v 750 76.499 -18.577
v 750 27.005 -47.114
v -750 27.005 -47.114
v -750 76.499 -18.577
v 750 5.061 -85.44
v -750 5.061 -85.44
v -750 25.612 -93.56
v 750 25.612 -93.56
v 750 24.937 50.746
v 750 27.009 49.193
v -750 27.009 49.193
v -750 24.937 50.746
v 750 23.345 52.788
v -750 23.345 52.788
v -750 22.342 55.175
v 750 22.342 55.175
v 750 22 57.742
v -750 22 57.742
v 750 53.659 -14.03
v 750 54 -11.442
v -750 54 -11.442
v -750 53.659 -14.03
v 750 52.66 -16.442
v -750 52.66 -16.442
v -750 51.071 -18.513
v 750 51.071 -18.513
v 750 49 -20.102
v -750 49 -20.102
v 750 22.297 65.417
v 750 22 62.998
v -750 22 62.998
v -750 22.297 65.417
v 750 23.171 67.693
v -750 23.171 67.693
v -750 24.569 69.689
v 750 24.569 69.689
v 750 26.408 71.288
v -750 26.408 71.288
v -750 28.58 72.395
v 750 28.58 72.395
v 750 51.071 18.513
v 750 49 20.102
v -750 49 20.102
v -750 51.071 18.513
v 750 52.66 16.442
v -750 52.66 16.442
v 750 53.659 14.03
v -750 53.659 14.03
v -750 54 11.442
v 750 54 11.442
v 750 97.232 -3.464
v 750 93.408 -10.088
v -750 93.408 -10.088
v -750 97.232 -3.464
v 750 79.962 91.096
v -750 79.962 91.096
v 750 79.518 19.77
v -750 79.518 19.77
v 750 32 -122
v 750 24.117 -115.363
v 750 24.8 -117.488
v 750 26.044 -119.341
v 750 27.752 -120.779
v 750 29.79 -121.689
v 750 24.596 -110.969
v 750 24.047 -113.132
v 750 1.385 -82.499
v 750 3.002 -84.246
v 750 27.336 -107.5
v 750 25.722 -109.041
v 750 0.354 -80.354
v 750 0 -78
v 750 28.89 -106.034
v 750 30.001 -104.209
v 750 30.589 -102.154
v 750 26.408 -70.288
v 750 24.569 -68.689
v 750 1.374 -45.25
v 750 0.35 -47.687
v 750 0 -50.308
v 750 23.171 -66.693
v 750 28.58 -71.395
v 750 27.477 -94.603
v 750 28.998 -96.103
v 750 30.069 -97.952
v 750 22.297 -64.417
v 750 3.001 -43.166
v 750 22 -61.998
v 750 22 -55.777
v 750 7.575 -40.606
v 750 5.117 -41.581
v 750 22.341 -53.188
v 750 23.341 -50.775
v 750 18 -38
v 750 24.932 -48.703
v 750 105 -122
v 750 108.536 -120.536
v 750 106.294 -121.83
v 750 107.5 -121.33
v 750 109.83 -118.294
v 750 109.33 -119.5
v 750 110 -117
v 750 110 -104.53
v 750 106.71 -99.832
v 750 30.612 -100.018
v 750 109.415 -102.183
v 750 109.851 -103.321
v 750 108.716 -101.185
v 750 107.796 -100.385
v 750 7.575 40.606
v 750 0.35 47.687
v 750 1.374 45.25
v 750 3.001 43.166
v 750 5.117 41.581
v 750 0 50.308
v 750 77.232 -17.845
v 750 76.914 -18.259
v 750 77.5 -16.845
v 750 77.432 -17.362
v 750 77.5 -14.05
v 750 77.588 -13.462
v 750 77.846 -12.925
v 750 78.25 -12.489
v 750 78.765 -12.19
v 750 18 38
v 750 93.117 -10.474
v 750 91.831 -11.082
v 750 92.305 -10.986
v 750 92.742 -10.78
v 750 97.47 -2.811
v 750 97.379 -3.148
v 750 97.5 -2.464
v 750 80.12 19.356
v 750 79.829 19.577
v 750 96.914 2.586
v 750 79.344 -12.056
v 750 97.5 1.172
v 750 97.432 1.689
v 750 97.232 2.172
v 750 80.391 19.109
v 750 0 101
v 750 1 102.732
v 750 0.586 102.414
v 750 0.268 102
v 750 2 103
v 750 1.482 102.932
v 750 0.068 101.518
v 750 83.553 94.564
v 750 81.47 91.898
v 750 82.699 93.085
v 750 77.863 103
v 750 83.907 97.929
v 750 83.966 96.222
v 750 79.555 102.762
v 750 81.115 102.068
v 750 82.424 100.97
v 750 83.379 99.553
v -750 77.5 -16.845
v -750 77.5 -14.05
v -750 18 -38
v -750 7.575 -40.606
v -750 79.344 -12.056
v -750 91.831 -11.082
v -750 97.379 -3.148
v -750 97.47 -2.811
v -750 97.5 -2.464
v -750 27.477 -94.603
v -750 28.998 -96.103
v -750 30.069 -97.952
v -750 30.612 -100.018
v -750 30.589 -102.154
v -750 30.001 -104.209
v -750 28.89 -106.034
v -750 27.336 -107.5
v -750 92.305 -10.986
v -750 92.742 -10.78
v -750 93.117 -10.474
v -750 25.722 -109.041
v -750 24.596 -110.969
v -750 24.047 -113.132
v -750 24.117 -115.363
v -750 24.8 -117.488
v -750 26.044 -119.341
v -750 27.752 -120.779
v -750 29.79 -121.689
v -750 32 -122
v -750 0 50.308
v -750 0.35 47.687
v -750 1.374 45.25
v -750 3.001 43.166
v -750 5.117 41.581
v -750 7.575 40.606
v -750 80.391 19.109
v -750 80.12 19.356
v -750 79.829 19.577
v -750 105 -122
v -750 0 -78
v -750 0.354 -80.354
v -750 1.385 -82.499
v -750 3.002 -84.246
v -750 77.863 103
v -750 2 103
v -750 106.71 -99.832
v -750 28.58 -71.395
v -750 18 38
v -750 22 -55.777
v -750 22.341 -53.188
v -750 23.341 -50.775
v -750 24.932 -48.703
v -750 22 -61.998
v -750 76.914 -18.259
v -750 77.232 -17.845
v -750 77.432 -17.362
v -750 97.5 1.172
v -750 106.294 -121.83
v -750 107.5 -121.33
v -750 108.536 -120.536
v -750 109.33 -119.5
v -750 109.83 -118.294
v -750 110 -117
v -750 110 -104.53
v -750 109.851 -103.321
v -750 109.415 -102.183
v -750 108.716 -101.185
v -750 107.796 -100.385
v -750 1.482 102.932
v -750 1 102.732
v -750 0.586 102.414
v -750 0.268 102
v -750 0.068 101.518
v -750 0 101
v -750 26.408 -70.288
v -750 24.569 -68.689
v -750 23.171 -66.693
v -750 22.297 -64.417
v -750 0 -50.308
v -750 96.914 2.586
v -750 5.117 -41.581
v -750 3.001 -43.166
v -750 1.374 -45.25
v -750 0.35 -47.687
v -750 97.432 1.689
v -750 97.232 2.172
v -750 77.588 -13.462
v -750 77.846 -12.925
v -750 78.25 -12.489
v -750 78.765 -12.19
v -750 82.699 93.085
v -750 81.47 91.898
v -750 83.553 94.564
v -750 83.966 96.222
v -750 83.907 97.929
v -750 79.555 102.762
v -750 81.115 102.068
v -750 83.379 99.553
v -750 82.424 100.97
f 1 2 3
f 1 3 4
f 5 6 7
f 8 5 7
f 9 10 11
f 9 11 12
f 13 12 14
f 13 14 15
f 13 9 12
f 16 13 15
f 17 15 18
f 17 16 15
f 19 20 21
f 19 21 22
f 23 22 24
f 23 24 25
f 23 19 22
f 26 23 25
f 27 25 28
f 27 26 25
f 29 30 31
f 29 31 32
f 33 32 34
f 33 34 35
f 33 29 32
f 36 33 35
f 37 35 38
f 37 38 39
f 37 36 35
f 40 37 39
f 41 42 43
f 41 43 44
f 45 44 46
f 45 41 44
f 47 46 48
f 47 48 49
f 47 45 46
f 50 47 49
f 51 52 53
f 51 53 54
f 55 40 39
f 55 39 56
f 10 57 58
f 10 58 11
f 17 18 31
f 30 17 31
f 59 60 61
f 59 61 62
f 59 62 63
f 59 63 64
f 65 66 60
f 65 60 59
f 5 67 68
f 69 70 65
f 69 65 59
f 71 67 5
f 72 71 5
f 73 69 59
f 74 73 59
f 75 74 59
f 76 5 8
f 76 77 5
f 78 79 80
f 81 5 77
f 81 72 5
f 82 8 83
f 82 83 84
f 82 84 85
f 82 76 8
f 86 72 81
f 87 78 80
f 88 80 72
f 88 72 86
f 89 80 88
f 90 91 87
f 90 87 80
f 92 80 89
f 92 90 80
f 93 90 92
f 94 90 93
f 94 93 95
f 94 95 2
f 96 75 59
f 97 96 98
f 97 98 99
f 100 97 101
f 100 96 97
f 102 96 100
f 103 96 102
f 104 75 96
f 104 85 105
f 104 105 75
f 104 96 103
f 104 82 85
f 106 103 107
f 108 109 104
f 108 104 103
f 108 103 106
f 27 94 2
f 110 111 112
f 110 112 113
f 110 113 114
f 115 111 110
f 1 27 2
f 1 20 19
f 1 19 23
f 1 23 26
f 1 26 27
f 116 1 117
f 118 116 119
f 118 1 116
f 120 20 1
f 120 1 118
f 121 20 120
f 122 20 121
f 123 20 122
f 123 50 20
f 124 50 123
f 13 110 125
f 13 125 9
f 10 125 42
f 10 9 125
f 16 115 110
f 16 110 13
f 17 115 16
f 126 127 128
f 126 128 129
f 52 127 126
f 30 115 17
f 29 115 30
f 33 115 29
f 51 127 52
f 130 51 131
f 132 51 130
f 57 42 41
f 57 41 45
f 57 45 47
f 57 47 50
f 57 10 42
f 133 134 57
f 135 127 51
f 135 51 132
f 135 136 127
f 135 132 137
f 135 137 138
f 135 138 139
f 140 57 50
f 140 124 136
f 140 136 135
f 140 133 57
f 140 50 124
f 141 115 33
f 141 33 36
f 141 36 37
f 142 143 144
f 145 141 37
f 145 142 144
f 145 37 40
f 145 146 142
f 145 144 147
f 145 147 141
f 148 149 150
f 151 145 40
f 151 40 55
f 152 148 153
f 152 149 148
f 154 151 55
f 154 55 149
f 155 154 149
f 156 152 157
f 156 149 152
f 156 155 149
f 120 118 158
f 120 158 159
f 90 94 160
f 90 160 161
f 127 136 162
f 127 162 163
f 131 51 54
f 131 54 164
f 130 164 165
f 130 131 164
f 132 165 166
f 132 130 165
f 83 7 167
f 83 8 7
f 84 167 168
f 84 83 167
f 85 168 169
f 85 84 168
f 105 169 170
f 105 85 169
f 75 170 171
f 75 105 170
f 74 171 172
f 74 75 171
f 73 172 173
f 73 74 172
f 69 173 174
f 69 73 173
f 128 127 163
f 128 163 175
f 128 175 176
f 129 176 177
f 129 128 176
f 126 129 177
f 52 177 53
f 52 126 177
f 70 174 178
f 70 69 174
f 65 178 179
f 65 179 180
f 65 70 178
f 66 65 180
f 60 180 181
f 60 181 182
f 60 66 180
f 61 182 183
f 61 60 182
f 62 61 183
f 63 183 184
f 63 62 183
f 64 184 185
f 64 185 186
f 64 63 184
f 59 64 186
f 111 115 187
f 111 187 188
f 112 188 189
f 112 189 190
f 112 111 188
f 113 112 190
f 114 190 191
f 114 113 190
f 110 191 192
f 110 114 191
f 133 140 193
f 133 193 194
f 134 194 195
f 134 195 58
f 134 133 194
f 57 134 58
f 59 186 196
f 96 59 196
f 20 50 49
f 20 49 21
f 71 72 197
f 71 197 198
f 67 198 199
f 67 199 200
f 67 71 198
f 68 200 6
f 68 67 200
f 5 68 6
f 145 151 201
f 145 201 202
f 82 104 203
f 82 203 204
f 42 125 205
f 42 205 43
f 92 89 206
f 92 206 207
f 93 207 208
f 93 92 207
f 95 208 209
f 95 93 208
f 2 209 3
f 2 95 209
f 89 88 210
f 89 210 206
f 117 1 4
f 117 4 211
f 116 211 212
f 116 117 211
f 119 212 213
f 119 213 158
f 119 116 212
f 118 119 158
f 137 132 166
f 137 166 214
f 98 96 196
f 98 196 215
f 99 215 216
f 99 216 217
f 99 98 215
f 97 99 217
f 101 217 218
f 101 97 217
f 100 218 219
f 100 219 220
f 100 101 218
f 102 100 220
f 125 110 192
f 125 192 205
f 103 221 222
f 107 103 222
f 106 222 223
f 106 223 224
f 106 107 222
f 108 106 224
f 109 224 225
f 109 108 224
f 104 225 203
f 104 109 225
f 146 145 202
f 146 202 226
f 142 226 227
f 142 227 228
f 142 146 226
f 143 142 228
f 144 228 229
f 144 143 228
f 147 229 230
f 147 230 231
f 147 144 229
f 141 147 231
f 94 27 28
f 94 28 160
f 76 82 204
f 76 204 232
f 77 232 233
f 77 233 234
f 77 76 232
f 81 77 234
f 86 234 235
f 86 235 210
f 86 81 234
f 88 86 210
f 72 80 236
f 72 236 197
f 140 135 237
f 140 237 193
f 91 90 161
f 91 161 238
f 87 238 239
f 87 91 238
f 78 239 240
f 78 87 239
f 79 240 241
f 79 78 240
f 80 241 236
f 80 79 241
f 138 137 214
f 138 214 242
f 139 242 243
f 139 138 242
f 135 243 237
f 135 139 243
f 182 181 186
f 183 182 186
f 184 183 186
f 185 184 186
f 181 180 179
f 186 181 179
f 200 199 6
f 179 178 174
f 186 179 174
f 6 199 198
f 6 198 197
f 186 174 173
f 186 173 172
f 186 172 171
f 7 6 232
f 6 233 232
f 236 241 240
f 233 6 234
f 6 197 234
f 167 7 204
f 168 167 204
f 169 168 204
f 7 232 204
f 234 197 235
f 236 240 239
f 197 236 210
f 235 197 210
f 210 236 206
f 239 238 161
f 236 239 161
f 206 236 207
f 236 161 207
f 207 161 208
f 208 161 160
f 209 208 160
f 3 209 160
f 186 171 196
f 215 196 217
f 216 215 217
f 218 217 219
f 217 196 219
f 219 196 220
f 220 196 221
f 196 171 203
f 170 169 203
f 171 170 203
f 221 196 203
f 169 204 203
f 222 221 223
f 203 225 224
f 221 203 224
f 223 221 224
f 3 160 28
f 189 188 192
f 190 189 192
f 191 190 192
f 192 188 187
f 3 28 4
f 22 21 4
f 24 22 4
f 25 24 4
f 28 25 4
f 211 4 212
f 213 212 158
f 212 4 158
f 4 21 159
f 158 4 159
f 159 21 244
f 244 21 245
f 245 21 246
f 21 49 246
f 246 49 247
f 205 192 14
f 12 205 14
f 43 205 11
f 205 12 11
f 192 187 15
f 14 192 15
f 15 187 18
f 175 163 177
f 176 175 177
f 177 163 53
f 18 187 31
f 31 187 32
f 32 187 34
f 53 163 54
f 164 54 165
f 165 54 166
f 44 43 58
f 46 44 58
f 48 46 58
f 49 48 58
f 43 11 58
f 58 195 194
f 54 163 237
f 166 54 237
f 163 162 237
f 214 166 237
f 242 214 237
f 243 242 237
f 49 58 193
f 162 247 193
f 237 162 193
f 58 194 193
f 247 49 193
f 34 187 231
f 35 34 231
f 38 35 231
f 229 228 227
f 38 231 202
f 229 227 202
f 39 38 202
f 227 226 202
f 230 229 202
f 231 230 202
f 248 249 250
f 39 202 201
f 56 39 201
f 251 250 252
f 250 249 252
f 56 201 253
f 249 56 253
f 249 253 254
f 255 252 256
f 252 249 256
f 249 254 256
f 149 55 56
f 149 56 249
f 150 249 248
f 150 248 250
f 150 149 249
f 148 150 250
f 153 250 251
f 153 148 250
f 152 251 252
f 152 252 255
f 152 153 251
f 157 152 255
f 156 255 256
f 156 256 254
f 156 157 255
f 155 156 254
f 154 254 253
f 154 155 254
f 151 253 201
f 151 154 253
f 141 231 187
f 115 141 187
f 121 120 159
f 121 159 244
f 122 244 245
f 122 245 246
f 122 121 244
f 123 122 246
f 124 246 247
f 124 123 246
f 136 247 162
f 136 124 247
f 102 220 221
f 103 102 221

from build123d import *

# Parameters (mm, degrees)
F1_DEPTH = 750


with BuildPart() as f1:
    # F0 (on Right) → F1 (new body, symmetric)
    with BuildSketch(Plane.YZ):
        with BuildLine():
            Line((32, -122), (105, -122))
            ThreePointArc((105, -122), (108.5355339059, -120.5355339059), (110, -117))
            Line((110, -117), (110, -104.5304183065))
            ThreePointArc((110, -104.5304183065), (109.0957602214, -101.6625361247), (106.7101007166, -99.8319552025))
            Line((106.7101007166, -99.8319552025), (28.5797985667, -71.3948508258))
            ThreePointArc((28.5797985667, -71.3948508258), (23.8084795571, -67.7336889814), (22, -61.9979246179))
            Line((22, -61.9979246179), (22, -55.7773730996))
            ThreePointArc((22, -55.7773730996), (23.3411974865, -50.774859828), (27.0050278066, -47.1142182016))
            Line((27.0050278066, -47.1142182016), (76.4989944387, -18.5771563597))
            ThreePointArc((76.4989944387, -18.5771563597), (77.2317605027, -17.8450280344), (77.5, -16.8445253801))
            Line((77.5, -16.8445253801), (77.5, -14.0500428085))
            ThreePointArc((77.5, -14.0500428085), (78.031816786, -12.6919419101), (79.34443805, -12.0561018666))
            Line((79.34443805, -12.0561018666), (91.8312687602, -11.0819126648))
            ThreePointArc((91.8312687602, -11.0819126648), (92.7423605167, -10.7797902328), (93.4077576178, -10.0879717229))
            Line((93.4077576178, -10.0879717229), (97.2320508076, -3.4641016151))
            ThreePointArc((97.2320508076, -3.4641016151), (97.4318516526, -2.9817397053), (97.5, -2.4641016151))
            Line((97.5, -2.4641016151), (97.5, 1.1715728753))
            ThreePointArc((97.5, 1.1715728753), (97.347759065, 1.93693974), (96.9142135624, 2.5857864376))
            Line((96.9142135624, 2.5857864376), (80.3908701189, 19.1091298811))
            ThreePointArc((80.3908701189, 19.1091298811), (79.9770526202, 19.4696932477), (79.5177724194, 19.7702137305))
            Line((79.5177724194, 19.7702137305), (27.0094429083, 49.1929845773))
            ThreePointArc((27.0094429083, 49.1929845773), (23.3446035132, 52.7878671993), (22, 57.742286464))
            Line((22, 57.742286464), (22, 62.9979246179))
            ThreePointArc((22, 62.9979246179), (23.8084795571, 68.7336889814), (28.5797985667, 72.3948508258))
            Line((28.5797985667, 72.3948508258), (79.9621046277, 91.0964807999))
            ThreePointArc((79.9621046277, 91.0964807999), (83.9067681128, 97.9288383748), (77.8631930273, 103))
            Line((77.8631930273, 103), (2, 103))
            ThreePointArc((2, 103), (0.5857864376, 102.4142135624), (0, 101))
            Line((0, 101), (0, 50.307764064))
            ThreePointArc((0, 50.307764064), (2.1179456198, 44.15364197), (7.5746437496, 40.6063390626))
            Line((7.5746437496, 40.6063390626), (18, 38))
            Line((18, 38), (49, 20.1021416551))
            ThreePointArc((49, 20.1021416551), (52.6602540378, 16.4418876173), (54, 11.4418876173))
            Line((54, 11.4418876173), (54, -11.4418876173))
            ThreePointArc((54, -11.4418876173), (52.6602540378, -16.4418876173), (49, -20.1021416551))
            Line((49, -20.1021416551), (18, -38))
            Line((18, -38), (7.5746437496, -40.6063390626))
            ThreePointArc((7.5746437496, -40.6063390626), (2.1179456198, -44.15364197), (0, -50.307764064))
            Line((0, -50.307764064), (0, -78))
            ThreePointArc((0, -78), (1.385033519, -82.4991353008), (5.0605546137, -85.4404073021))
            Line((5.0605546137, -85.4404073021), (25.6120663332, -93.5595926979))
            ThreePointArc((25.6120663332, -93.5595926979), (30.6121205573, -100.0179888304), (27.3363104735, -107.5))
            ThreePointArc((27.3363104735, -107.5), (24.3842268941, -116.4494897428), (32, -122))
        make_face()
    extrude(amount=F1_DEPTH, both=True)


solid = f1.part
